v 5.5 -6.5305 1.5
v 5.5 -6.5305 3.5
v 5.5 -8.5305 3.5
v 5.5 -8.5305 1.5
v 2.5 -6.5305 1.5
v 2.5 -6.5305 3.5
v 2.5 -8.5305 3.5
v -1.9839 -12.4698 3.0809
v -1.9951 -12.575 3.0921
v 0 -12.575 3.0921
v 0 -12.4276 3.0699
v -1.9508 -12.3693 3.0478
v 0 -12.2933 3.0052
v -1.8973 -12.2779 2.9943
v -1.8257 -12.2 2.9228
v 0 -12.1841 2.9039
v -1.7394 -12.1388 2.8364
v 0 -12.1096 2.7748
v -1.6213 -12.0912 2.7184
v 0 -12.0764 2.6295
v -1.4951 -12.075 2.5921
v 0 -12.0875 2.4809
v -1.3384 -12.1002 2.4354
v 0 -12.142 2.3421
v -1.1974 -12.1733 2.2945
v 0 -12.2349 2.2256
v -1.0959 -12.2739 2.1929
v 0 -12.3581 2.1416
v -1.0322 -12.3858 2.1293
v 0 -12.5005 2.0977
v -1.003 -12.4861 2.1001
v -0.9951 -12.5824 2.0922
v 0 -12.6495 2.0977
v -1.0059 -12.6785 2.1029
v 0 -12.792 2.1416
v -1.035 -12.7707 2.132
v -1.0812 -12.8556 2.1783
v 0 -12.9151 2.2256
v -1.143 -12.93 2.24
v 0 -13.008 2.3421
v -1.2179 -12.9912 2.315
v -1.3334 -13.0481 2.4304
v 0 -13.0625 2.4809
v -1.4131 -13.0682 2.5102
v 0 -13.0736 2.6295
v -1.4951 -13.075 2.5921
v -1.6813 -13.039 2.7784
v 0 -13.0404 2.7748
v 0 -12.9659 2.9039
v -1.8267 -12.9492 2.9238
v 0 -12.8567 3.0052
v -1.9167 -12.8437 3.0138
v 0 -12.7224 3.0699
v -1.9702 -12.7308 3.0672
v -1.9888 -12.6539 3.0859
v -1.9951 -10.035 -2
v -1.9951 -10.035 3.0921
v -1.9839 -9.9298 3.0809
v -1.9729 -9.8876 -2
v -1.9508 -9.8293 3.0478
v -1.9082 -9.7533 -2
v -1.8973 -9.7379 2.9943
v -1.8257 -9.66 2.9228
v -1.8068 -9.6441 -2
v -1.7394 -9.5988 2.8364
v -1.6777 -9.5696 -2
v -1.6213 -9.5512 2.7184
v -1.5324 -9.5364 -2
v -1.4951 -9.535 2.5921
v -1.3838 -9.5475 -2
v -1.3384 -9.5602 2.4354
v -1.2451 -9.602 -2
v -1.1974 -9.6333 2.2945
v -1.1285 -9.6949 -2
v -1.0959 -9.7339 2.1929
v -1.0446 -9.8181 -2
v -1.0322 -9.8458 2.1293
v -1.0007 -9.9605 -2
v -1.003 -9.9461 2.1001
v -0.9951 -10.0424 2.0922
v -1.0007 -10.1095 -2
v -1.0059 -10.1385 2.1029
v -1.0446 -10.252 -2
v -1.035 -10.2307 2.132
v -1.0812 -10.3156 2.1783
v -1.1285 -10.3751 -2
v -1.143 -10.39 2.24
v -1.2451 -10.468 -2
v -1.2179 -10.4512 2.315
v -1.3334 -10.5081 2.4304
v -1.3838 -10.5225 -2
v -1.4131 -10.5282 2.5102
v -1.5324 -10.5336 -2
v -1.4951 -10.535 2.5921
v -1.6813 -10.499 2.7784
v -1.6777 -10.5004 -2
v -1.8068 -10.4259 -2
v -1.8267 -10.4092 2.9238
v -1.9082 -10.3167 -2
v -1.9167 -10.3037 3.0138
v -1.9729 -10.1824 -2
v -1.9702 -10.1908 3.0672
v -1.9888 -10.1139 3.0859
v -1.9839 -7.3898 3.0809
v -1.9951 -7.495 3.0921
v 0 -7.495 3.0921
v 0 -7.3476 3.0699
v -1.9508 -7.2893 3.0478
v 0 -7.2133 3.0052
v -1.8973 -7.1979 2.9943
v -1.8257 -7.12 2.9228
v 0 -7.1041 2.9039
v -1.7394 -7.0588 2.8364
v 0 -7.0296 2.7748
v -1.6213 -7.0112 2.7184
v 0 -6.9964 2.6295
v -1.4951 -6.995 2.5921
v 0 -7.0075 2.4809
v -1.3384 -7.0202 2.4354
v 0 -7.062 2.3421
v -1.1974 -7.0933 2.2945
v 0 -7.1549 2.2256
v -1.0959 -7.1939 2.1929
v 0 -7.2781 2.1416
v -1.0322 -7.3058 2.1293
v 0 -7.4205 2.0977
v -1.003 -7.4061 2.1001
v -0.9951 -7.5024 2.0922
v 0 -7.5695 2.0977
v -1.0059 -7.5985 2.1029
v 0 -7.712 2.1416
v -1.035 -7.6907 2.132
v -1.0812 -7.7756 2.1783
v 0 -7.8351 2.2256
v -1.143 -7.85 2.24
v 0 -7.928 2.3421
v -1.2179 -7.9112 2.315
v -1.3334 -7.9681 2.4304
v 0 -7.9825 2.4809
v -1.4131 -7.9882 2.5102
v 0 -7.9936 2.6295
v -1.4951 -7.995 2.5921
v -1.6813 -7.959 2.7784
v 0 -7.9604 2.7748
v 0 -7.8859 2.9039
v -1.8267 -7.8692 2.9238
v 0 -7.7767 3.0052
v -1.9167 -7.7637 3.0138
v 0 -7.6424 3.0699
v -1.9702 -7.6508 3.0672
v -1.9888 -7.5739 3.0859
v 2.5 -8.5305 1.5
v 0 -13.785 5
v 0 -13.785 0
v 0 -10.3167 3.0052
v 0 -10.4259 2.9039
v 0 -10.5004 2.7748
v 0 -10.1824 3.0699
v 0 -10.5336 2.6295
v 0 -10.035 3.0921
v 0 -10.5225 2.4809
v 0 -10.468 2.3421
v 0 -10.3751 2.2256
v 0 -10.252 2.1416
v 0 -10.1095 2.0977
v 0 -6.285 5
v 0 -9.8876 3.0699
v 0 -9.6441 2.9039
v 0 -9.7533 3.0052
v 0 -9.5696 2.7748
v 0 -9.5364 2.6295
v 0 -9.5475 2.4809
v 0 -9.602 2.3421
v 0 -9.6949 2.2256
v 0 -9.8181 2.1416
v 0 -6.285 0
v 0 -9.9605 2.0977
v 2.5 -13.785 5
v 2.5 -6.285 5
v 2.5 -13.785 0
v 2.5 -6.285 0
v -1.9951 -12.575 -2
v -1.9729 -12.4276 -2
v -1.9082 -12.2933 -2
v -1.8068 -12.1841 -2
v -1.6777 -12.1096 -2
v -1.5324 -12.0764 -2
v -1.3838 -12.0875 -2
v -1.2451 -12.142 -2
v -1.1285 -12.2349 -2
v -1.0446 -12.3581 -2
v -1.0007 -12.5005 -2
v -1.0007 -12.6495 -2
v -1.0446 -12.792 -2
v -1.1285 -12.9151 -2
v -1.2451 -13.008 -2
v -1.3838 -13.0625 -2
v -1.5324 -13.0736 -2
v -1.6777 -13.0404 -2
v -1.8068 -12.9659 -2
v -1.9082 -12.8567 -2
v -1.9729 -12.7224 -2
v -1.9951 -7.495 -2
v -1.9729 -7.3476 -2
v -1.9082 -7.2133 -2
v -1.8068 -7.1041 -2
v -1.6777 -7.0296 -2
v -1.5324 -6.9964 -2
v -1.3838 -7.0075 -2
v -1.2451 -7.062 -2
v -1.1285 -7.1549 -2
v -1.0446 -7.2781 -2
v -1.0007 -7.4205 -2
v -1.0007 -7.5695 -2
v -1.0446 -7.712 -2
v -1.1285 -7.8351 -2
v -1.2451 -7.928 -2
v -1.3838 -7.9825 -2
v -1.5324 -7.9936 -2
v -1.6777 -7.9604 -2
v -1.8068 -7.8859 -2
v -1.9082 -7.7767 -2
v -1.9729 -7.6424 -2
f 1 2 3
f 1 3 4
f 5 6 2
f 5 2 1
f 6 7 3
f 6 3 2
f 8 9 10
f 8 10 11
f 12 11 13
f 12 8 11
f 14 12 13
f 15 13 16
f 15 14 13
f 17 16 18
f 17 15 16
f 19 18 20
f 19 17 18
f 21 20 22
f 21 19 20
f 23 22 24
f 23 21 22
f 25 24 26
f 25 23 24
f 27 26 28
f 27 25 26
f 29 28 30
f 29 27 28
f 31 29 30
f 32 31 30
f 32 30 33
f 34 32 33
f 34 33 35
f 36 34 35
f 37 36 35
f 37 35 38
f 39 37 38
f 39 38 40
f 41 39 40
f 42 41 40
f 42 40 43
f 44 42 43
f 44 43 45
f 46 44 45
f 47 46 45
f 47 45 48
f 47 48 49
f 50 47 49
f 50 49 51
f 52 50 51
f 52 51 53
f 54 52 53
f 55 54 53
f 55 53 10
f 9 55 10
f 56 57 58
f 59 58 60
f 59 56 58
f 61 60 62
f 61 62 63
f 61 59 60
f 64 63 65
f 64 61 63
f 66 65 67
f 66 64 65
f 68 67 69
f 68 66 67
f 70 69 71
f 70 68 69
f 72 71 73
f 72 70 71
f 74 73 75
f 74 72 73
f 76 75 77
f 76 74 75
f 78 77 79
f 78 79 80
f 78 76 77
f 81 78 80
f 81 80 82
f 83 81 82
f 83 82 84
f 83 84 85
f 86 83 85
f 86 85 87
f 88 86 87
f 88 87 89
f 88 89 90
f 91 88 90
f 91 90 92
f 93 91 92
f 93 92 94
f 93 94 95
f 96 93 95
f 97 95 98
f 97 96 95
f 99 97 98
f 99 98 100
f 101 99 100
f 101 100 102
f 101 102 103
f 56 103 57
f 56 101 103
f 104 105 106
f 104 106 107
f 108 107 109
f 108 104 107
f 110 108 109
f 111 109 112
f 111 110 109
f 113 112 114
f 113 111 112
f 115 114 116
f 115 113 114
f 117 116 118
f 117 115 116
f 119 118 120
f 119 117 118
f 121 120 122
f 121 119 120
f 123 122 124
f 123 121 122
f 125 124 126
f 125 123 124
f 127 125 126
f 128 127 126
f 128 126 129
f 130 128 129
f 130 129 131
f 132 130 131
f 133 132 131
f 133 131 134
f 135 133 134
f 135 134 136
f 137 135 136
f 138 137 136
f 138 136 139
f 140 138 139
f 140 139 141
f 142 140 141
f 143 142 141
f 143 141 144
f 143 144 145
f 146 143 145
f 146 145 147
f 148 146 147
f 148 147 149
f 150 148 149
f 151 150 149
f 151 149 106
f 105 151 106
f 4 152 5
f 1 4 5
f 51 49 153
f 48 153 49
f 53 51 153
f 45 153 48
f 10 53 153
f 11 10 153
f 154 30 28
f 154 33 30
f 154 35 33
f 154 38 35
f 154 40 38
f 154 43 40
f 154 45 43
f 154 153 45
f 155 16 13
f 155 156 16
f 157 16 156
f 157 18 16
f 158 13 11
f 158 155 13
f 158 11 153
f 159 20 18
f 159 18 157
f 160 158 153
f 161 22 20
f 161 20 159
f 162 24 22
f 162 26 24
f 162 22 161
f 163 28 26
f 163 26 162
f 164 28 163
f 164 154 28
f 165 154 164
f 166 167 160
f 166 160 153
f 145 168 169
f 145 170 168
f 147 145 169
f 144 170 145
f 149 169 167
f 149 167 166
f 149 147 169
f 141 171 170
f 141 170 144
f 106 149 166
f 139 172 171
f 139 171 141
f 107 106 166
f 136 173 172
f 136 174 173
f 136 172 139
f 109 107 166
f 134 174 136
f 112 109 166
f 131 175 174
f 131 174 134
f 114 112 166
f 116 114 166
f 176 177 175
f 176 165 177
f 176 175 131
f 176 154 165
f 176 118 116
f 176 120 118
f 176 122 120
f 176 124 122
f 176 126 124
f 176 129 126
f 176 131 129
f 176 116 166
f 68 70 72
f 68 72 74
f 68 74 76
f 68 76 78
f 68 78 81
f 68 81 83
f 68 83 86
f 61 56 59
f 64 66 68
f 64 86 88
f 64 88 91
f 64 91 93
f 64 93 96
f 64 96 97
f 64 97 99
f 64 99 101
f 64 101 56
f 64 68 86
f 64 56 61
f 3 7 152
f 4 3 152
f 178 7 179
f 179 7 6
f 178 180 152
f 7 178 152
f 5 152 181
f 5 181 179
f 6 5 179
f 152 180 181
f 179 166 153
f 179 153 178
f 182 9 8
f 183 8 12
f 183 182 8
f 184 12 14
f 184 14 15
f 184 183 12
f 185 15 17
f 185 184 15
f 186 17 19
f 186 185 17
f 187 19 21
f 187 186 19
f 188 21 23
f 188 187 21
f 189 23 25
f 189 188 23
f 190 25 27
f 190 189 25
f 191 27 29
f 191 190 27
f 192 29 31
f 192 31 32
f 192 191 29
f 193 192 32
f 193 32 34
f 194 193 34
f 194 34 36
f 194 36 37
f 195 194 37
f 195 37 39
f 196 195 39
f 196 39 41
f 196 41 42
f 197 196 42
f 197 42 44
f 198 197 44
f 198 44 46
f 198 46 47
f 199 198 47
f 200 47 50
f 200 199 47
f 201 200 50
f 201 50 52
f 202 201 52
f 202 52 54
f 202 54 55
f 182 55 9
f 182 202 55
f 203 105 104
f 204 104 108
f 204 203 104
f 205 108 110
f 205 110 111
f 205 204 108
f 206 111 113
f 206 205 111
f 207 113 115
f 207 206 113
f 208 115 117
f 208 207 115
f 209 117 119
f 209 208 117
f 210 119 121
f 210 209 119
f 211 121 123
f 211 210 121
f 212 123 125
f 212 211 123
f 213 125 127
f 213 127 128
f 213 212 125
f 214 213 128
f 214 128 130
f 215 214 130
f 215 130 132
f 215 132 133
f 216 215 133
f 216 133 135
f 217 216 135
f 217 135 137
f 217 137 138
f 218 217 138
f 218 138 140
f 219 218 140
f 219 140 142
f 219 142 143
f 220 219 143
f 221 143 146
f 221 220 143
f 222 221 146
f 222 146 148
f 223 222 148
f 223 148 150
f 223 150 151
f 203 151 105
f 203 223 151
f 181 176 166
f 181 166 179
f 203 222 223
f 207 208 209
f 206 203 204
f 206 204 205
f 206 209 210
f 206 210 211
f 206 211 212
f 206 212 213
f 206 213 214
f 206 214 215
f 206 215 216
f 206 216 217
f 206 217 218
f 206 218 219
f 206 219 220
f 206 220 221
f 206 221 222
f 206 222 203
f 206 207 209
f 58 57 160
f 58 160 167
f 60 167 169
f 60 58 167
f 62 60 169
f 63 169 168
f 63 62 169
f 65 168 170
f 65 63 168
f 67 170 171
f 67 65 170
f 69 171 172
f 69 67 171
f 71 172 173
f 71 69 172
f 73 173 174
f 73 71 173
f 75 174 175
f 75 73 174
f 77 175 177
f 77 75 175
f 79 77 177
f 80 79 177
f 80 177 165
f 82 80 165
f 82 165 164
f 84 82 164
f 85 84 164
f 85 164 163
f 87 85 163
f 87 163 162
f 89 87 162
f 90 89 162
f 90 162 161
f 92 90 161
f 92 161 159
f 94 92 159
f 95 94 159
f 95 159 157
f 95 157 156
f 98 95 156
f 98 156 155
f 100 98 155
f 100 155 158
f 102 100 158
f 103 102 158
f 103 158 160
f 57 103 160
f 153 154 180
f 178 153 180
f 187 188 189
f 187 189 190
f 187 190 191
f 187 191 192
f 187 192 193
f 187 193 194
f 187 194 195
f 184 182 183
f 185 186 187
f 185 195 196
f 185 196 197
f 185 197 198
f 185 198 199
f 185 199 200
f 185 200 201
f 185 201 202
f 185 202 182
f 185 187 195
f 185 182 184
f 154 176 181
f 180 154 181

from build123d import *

# Parameters (mm, degrees)
SKETCH_1_W      = 2.5
SKETCH_1_H      = 7.5
EXTRUDE_1_DEPTH = 5
SKETCH_2_W      = 2
SKETCH_2_H      = 2
EXTRUDE_2_DEPTH = 3
SKETCH_3_R      = 0.5


with BuildPart() as part:
    # 草图1 → 凸台-拉伸1 (new body)
    with BuildSketch(Plane.XY):
        with Locations((1.25, -10.035009445)):
            Rectangle(SKETCH_1_W, SKETCH_1_H)
    extrude(amount=EXTRUDE_1_DEPTH)

    # 草图2 → 凸台-拉伸2 (add)
    with BuildSketch(Plane(origin=(2.5, 0, 0), x_dir=(0, 0, -1), z_dir=(1, 0, 0))):
        with Locations((-2.5, -7.530464336)):
            Rectangle(SKETCH_2_W, SKETCH_2_H)
    extrude(amount=EXTRUDE_2_DEPTH)

    # 扫描1: sweep along a path in 草图4
    with BuildLine(Plane.XZ.offset(10.035009445)) as sweep_1_path:
        Line((0, 3.097044355), (-2, 3.097044355))
        Line((-2, 3.097044355), (-2, -2))
    # 草图3 → 扫描1 (sweep)
    with BuildSketch(Plane.ZY):
        with Locations((2.592115007, -10.035009445)):
            Circle(SKETCH_3_R)
        with Locations((2.592115007, -7.495009445)):
            Circle(SKETCH_3_R)
        with Locations((2.592115007, -12.575009445)):
            Circle(SKETCH_3_R)
    sweep(path=sweep_1_path.line, transition=Transition.RIGHT)


solid = part.part
